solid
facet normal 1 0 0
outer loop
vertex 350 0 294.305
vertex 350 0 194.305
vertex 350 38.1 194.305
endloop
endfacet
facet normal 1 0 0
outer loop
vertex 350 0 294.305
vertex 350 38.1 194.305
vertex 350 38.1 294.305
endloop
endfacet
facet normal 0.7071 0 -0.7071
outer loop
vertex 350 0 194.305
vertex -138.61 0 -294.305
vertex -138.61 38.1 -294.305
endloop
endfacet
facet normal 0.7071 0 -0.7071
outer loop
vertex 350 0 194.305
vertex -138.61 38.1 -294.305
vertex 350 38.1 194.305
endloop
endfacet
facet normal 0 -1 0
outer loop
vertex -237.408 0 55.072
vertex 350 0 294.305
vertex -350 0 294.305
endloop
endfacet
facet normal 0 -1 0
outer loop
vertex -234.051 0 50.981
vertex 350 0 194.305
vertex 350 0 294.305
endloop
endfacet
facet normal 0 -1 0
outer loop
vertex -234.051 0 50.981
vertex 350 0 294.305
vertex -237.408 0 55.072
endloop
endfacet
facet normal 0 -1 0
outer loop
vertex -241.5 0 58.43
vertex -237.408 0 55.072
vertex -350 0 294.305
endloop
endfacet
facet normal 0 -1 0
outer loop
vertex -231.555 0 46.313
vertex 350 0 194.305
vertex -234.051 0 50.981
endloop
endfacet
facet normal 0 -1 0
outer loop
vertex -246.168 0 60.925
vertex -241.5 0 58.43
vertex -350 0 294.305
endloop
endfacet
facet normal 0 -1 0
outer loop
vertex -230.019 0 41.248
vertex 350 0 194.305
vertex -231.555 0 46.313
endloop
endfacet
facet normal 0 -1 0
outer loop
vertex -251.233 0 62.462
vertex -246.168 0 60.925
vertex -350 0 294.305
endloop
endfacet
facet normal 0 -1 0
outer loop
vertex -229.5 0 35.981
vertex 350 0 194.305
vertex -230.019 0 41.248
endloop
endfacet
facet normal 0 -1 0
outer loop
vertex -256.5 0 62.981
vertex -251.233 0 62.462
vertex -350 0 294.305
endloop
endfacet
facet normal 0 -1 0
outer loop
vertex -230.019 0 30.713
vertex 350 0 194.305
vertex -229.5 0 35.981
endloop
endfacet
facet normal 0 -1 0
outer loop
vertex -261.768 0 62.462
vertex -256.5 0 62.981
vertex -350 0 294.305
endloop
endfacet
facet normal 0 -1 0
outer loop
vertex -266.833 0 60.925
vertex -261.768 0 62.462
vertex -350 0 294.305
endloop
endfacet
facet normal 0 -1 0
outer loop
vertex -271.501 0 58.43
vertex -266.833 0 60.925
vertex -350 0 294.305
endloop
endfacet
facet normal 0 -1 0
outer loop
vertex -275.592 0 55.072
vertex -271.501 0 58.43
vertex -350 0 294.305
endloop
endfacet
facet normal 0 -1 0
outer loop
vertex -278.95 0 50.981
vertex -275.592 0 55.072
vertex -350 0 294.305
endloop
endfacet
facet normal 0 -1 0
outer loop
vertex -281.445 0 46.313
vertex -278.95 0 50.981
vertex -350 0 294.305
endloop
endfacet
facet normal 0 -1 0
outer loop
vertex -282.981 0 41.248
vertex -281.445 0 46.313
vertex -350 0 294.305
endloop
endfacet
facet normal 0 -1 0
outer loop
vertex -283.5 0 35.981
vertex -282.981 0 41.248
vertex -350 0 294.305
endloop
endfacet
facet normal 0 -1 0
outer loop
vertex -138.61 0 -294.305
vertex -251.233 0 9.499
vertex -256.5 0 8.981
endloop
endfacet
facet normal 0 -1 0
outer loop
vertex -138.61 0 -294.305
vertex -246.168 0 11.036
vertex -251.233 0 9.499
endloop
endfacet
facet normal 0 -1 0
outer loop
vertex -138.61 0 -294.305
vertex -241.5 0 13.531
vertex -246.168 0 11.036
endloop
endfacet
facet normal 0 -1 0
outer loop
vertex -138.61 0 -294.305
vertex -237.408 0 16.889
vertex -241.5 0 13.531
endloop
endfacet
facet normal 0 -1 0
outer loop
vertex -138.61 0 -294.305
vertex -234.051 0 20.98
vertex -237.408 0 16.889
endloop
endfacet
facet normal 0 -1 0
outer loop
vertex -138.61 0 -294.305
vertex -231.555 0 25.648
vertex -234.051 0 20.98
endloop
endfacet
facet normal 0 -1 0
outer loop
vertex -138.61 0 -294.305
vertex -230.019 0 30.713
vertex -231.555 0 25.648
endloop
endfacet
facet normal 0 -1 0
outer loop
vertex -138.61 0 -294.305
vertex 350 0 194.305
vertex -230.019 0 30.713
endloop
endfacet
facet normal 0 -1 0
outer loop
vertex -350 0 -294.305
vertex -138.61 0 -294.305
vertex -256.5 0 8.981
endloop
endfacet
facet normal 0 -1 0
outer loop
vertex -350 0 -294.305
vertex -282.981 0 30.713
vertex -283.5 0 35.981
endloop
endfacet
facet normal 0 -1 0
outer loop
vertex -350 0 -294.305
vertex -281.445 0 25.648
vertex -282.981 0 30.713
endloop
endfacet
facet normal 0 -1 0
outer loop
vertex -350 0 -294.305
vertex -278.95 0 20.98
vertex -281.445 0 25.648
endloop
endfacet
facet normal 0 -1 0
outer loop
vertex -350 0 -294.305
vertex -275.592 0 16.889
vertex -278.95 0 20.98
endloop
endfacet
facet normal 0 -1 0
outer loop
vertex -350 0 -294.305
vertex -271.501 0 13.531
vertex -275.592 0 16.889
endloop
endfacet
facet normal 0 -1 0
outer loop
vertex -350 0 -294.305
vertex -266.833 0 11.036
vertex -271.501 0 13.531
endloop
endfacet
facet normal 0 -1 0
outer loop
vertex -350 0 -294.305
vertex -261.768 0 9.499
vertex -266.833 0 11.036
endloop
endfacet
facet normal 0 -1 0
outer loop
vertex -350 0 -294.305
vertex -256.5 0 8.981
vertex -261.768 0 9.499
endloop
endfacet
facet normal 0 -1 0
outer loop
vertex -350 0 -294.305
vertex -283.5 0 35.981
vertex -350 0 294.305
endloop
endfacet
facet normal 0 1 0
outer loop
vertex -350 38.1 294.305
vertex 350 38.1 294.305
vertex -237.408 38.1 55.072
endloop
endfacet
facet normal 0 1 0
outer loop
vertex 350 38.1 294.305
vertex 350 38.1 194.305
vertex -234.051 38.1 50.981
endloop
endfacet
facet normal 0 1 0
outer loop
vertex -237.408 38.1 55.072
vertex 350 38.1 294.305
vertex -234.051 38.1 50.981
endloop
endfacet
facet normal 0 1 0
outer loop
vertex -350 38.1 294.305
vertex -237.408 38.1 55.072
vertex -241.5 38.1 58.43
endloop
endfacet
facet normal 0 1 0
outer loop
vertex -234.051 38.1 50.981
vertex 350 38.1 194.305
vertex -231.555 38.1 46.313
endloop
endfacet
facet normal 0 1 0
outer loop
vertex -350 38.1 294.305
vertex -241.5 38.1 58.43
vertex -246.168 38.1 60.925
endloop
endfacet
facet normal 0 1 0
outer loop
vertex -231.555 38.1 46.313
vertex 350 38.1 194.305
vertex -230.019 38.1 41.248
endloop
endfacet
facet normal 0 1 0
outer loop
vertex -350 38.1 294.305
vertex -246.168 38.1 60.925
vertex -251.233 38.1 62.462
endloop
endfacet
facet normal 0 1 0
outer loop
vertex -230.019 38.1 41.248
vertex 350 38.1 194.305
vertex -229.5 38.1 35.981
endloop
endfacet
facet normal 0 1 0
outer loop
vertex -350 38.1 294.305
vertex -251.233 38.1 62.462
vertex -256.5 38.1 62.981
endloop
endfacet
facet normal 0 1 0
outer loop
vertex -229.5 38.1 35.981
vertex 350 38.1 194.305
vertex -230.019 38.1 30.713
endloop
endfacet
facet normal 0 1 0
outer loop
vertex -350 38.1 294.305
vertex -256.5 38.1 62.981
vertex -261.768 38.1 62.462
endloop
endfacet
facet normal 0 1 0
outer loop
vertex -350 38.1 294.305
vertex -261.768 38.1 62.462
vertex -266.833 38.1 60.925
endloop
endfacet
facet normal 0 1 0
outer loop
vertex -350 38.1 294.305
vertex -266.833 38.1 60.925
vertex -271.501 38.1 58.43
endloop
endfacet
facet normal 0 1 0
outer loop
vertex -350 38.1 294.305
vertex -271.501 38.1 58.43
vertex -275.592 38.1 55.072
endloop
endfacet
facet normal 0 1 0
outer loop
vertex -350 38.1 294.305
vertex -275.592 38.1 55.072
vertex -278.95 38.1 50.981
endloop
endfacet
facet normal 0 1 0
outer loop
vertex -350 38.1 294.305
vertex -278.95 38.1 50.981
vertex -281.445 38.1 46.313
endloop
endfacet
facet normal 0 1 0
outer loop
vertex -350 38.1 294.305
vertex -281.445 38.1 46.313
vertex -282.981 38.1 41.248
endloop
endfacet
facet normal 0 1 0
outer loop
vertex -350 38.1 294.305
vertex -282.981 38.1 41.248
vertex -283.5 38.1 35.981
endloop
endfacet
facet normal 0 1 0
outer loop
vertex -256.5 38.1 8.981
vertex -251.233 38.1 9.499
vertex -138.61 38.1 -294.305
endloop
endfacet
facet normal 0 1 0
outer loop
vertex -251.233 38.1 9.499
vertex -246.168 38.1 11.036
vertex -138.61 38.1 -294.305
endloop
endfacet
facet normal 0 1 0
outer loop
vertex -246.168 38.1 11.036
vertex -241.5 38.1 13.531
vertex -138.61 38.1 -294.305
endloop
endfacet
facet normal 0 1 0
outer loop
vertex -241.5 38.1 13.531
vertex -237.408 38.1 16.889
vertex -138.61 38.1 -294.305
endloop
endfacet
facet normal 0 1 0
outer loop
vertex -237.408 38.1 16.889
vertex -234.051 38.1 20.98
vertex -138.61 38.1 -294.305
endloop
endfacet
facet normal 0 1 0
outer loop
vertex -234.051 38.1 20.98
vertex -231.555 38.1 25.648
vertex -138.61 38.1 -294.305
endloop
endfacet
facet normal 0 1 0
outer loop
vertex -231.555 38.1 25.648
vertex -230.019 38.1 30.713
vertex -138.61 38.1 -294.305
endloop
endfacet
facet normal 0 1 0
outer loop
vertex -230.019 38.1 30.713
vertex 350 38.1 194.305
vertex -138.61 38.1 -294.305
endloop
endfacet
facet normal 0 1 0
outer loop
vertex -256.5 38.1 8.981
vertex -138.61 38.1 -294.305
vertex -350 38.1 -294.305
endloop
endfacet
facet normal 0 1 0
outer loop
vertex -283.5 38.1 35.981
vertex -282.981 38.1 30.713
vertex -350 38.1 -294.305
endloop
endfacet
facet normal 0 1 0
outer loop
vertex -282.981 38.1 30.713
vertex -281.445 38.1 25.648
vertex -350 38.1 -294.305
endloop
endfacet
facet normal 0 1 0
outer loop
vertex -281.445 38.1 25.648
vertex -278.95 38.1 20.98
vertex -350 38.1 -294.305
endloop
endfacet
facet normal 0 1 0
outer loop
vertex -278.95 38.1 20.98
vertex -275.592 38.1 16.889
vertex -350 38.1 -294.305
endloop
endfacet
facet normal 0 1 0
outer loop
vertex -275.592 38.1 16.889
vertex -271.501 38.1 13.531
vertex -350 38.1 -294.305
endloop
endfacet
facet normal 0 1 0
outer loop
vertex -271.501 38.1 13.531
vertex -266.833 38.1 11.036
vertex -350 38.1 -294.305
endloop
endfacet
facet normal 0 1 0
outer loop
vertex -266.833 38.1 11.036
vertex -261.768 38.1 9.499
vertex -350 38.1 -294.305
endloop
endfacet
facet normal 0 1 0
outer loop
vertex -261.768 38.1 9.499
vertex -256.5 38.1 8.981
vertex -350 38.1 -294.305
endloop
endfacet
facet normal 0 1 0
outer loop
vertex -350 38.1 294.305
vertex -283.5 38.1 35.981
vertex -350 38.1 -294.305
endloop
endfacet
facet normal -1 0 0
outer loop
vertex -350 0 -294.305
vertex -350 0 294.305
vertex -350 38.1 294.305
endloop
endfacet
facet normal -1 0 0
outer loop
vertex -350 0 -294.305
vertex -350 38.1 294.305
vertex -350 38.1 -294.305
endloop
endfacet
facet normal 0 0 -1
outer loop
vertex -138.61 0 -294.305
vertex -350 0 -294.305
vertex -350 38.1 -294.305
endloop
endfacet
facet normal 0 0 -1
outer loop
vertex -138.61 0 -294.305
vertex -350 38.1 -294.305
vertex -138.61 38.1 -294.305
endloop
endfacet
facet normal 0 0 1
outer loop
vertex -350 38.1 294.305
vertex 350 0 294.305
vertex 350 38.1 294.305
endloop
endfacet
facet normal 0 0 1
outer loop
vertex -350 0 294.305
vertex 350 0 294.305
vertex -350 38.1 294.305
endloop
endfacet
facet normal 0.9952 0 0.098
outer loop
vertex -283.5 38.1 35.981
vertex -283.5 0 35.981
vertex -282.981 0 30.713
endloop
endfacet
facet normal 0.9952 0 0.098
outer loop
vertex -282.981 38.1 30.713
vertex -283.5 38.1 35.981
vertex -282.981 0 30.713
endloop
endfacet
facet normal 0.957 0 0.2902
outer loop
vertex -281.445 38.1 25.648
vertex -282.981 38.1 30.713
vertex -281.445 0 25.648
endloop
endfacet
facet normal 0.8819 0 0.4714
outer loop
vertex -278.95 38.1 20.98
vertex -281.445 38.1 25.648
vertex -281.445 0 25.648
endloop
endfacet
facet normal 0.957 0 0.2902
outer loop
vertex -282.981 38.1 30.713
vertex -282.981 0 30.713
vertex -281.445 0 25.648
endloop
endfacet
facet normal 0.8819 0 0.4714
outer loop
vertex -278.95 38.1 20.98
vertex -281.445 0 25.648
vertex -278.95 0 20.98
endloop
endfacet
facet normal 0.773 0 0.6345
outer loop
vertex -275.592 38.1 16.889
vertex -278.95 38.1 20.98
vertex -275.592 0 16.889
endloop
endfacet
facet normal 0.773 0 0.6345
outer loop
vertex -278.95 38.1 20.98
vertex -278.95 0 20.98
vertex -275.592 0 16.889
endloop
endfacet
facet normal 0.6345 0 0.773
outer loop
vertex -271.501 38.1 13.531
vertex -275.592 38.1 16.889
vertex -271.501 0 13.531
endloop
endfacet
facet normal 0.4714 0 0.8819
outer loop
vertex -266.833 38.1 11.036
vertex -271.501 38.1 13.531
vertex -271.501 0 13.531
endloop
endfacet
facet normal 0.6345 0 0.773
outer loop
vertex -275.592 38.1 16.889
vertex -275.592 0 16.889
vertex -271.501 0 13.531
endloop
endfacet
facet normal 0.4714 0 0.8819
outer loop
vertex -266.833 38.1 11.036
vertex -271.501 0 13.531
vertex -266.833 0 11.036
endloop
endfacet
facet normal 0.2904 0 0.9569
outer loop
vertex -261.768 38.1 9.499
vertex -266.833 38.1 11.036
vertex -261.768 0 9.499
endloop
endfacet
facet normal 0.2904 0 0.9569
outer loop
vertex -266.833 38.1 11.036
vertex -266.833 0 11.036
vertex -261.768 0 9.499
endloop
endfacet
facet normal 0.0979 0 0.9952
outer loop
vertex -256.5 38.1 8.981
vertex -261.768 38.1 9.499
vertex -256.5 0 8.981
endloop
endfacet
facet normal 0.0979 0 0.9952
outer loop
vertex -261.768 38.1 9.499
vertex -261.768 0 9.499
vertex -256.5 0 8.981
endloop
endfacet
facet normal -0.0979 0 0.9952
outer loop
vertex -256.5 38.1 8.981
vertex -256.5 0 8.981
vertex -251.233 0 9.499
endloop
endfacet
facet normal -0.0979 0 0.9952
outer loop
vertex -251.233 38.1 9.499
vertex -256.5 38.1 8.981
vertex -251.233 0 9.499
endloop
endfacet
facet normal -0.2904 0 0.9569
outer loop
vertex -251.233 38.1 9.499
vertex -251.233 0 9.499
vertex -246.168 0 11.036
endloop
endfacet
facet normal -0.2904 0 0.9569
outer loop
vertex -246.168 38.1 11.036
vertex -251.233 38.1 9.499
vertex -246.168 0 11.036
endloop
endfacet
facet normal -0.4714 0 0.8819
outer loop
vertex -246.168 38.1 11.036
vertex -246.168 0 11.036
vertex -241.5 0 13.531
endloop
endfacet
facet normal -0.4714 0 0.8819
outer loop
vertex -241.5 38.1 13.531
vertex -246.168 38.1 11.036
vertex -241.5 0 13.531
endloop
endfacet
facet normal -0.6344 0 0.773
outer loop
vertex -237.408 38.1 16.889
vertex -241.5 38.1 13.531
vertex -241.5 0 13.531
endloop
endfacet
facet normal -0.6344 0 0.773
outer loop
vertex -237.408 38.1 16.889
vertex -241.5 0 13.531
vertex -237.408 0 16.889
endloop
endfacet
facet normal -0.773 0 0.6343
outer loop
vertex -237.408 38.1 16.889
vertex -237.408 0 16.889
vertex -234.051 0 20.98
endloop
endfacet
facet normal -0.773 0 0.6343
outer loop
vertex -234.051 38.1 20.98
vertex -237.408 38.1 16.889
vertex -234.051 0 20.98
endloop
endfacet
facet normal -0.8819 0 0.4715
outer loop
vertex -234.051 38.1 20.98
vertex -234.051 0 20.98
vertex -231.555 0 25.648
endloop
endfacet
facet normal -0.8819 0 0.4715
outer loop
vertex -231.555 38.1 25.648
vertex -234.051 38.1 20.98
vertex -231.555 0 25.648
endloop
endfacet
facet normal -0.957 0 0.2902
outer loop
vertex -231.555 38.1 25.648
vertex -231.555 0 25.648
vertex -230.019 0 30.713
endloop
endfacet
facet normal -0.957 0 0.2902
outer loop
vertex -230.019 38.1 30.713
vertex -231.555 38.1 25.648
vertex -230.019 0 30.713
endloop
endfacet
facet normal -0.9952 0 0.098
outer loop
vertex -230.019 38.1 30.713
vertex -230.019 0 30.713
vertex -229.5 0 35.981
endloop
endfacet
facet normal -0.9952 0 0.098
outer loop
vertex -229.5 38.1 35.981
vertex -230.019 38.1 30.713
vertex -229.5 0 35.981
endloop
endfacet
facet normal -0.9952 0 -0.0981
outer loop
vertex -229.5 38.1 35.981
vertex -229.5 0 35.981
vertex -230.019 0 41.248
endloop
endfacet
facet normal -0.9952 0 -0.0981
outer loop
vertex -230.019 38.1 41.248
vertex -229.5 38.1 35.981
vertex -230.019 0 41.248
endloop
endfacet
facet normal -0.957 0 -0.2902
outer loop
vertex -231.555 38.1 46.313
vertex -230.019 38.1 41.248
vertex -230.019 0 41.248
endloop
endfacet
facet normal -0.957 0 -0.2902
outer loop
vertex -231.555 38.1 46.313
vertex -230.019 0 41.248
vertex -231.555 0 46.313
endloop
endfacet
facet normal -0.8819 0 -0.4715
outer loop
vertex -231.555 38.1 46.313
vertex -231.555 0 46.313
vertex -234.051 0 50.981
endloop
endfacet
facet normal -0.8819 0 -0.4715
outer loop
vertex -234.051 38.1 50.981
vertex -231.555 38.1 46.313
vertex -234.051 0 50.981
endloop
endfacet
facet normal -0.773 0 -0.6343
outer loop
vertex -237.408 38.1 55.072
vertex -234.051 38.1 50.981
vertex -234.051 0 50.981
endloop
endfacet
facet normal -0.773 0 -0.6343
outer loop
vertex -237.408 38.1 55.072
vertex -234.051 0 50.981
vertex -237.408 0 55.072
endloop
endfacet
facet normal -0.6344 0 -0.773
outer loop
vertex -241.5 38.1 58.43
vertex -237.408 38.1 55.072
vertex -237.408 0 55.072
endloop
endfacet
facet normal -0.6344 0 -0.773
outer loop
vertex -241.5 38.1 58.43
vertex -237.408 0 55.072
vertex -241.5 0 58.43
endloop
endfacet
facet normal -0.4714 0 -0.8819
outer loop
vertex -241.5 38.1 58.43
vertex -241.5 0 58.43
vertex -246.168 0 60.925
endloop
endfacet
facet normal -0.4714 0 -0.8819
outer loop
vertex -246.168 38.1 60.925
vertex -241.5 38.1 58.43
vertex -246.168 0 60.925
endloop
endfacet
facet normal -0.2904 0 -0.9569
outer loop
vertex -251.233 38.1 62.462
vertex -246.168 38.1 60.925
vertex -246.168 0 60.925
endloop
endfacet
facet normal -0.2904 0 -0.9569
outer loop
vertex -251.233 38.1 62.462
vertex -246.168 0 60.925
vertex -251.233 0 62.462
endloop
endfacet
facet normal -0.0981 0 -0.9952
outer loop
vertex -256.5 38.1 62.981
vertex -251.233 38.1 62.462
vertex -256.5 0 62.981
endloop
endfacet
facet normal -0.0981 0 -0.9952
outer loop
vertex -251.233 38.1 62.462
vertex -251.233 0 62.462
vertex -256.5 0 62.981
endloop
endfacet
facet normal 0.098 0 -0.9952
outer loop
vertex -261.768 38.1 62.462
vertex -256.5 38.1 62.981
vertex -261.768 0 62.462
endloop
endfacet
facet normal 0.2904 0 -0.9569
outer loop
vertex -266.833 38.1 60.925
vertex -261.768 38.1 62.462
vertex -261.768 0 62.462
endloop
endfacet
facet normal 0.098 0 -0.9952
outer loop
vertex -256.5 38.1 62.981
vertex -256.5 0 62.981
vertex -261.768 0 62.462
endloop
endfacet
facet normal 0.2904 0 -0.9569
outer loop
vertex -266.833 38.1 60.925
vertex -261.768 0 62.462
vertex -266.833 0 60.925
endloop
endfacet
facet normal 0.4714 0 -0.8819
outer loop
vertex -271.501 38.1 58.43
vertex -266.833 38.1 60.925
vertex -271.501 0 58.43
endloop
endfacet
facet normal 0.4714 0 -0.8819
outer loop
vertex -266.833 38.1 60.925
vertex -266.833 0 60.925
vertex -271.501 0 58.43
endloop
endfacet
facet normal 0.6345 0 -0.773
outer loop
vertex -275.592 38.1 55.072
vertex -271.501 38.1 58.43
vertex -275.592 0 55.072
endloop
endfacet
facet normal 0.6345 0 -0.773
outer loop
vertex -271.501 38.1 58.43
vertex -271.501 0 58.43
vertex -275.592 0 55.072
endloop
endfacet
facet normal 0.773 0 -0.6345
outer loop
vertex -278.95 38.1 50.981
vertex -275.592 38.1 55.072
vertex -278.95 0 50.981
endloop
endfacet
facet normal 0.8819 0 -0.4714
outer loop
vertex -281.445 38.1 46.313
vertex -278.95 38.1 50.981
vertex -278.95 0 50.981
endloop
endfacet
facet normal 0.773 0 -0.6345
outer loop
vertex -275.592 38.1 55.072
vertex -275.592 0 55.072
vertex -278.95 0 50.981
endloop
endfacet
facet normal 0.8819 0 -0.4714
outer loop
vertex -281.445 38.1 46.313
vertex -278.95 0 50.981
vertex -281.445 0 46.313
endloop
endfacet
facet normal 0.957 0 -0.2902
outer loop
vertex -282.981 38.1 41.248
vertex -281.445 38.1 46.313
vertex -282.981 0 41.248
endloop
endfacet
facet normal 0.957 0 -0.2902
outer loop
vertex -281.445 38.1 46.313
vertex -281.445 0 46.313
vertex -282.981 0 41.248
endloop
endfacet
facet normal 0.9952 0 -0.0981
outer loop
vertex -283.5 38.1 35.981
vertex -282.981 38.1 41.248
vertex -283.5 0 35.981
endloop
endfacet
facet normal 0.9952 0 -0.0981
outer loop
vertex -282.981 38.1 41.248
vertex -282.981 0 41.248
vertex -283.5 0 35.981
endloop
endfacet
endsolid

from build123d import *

# Parameters (mm, degrees)
BOSS_EXTRUDE1_DEPTH = 38.1
SKETCH2_R           = 27
CUT_EXTRUDE1_DEPTH  = 39.1


with BuildPart() as part:
    # Sketch1 → Boss-Extrude1 (new body)
    with BuildSketch(Plane(origin=(0, 0, 0), x_dir=(1, 0, 0), z_dir=(0, 1, 0))):
        Polygon((-138.61, 294.305), (350, -194.305), (350, -294.305), (-350, -294.305), (-350, 294.305), align=None)
    extrude(amount=BOSS_EXTRUDE1_DEPTH)

    # Sketch2 → Cut-Extrude1 (cut, through all)
    with BuildSketch(Plane(origin=(0, 0, 0), x_dir=(-1, 0, 0), z_dir=(0, -1, 0))):
        with Locations((256.500204402, -35.980503112)):
            Circle(SKETCH2_R)
    extrude(amount=-CUT_EXTRUDE1_DEPTH, mode=Mode.SUBTRACT)


solid = part.part
